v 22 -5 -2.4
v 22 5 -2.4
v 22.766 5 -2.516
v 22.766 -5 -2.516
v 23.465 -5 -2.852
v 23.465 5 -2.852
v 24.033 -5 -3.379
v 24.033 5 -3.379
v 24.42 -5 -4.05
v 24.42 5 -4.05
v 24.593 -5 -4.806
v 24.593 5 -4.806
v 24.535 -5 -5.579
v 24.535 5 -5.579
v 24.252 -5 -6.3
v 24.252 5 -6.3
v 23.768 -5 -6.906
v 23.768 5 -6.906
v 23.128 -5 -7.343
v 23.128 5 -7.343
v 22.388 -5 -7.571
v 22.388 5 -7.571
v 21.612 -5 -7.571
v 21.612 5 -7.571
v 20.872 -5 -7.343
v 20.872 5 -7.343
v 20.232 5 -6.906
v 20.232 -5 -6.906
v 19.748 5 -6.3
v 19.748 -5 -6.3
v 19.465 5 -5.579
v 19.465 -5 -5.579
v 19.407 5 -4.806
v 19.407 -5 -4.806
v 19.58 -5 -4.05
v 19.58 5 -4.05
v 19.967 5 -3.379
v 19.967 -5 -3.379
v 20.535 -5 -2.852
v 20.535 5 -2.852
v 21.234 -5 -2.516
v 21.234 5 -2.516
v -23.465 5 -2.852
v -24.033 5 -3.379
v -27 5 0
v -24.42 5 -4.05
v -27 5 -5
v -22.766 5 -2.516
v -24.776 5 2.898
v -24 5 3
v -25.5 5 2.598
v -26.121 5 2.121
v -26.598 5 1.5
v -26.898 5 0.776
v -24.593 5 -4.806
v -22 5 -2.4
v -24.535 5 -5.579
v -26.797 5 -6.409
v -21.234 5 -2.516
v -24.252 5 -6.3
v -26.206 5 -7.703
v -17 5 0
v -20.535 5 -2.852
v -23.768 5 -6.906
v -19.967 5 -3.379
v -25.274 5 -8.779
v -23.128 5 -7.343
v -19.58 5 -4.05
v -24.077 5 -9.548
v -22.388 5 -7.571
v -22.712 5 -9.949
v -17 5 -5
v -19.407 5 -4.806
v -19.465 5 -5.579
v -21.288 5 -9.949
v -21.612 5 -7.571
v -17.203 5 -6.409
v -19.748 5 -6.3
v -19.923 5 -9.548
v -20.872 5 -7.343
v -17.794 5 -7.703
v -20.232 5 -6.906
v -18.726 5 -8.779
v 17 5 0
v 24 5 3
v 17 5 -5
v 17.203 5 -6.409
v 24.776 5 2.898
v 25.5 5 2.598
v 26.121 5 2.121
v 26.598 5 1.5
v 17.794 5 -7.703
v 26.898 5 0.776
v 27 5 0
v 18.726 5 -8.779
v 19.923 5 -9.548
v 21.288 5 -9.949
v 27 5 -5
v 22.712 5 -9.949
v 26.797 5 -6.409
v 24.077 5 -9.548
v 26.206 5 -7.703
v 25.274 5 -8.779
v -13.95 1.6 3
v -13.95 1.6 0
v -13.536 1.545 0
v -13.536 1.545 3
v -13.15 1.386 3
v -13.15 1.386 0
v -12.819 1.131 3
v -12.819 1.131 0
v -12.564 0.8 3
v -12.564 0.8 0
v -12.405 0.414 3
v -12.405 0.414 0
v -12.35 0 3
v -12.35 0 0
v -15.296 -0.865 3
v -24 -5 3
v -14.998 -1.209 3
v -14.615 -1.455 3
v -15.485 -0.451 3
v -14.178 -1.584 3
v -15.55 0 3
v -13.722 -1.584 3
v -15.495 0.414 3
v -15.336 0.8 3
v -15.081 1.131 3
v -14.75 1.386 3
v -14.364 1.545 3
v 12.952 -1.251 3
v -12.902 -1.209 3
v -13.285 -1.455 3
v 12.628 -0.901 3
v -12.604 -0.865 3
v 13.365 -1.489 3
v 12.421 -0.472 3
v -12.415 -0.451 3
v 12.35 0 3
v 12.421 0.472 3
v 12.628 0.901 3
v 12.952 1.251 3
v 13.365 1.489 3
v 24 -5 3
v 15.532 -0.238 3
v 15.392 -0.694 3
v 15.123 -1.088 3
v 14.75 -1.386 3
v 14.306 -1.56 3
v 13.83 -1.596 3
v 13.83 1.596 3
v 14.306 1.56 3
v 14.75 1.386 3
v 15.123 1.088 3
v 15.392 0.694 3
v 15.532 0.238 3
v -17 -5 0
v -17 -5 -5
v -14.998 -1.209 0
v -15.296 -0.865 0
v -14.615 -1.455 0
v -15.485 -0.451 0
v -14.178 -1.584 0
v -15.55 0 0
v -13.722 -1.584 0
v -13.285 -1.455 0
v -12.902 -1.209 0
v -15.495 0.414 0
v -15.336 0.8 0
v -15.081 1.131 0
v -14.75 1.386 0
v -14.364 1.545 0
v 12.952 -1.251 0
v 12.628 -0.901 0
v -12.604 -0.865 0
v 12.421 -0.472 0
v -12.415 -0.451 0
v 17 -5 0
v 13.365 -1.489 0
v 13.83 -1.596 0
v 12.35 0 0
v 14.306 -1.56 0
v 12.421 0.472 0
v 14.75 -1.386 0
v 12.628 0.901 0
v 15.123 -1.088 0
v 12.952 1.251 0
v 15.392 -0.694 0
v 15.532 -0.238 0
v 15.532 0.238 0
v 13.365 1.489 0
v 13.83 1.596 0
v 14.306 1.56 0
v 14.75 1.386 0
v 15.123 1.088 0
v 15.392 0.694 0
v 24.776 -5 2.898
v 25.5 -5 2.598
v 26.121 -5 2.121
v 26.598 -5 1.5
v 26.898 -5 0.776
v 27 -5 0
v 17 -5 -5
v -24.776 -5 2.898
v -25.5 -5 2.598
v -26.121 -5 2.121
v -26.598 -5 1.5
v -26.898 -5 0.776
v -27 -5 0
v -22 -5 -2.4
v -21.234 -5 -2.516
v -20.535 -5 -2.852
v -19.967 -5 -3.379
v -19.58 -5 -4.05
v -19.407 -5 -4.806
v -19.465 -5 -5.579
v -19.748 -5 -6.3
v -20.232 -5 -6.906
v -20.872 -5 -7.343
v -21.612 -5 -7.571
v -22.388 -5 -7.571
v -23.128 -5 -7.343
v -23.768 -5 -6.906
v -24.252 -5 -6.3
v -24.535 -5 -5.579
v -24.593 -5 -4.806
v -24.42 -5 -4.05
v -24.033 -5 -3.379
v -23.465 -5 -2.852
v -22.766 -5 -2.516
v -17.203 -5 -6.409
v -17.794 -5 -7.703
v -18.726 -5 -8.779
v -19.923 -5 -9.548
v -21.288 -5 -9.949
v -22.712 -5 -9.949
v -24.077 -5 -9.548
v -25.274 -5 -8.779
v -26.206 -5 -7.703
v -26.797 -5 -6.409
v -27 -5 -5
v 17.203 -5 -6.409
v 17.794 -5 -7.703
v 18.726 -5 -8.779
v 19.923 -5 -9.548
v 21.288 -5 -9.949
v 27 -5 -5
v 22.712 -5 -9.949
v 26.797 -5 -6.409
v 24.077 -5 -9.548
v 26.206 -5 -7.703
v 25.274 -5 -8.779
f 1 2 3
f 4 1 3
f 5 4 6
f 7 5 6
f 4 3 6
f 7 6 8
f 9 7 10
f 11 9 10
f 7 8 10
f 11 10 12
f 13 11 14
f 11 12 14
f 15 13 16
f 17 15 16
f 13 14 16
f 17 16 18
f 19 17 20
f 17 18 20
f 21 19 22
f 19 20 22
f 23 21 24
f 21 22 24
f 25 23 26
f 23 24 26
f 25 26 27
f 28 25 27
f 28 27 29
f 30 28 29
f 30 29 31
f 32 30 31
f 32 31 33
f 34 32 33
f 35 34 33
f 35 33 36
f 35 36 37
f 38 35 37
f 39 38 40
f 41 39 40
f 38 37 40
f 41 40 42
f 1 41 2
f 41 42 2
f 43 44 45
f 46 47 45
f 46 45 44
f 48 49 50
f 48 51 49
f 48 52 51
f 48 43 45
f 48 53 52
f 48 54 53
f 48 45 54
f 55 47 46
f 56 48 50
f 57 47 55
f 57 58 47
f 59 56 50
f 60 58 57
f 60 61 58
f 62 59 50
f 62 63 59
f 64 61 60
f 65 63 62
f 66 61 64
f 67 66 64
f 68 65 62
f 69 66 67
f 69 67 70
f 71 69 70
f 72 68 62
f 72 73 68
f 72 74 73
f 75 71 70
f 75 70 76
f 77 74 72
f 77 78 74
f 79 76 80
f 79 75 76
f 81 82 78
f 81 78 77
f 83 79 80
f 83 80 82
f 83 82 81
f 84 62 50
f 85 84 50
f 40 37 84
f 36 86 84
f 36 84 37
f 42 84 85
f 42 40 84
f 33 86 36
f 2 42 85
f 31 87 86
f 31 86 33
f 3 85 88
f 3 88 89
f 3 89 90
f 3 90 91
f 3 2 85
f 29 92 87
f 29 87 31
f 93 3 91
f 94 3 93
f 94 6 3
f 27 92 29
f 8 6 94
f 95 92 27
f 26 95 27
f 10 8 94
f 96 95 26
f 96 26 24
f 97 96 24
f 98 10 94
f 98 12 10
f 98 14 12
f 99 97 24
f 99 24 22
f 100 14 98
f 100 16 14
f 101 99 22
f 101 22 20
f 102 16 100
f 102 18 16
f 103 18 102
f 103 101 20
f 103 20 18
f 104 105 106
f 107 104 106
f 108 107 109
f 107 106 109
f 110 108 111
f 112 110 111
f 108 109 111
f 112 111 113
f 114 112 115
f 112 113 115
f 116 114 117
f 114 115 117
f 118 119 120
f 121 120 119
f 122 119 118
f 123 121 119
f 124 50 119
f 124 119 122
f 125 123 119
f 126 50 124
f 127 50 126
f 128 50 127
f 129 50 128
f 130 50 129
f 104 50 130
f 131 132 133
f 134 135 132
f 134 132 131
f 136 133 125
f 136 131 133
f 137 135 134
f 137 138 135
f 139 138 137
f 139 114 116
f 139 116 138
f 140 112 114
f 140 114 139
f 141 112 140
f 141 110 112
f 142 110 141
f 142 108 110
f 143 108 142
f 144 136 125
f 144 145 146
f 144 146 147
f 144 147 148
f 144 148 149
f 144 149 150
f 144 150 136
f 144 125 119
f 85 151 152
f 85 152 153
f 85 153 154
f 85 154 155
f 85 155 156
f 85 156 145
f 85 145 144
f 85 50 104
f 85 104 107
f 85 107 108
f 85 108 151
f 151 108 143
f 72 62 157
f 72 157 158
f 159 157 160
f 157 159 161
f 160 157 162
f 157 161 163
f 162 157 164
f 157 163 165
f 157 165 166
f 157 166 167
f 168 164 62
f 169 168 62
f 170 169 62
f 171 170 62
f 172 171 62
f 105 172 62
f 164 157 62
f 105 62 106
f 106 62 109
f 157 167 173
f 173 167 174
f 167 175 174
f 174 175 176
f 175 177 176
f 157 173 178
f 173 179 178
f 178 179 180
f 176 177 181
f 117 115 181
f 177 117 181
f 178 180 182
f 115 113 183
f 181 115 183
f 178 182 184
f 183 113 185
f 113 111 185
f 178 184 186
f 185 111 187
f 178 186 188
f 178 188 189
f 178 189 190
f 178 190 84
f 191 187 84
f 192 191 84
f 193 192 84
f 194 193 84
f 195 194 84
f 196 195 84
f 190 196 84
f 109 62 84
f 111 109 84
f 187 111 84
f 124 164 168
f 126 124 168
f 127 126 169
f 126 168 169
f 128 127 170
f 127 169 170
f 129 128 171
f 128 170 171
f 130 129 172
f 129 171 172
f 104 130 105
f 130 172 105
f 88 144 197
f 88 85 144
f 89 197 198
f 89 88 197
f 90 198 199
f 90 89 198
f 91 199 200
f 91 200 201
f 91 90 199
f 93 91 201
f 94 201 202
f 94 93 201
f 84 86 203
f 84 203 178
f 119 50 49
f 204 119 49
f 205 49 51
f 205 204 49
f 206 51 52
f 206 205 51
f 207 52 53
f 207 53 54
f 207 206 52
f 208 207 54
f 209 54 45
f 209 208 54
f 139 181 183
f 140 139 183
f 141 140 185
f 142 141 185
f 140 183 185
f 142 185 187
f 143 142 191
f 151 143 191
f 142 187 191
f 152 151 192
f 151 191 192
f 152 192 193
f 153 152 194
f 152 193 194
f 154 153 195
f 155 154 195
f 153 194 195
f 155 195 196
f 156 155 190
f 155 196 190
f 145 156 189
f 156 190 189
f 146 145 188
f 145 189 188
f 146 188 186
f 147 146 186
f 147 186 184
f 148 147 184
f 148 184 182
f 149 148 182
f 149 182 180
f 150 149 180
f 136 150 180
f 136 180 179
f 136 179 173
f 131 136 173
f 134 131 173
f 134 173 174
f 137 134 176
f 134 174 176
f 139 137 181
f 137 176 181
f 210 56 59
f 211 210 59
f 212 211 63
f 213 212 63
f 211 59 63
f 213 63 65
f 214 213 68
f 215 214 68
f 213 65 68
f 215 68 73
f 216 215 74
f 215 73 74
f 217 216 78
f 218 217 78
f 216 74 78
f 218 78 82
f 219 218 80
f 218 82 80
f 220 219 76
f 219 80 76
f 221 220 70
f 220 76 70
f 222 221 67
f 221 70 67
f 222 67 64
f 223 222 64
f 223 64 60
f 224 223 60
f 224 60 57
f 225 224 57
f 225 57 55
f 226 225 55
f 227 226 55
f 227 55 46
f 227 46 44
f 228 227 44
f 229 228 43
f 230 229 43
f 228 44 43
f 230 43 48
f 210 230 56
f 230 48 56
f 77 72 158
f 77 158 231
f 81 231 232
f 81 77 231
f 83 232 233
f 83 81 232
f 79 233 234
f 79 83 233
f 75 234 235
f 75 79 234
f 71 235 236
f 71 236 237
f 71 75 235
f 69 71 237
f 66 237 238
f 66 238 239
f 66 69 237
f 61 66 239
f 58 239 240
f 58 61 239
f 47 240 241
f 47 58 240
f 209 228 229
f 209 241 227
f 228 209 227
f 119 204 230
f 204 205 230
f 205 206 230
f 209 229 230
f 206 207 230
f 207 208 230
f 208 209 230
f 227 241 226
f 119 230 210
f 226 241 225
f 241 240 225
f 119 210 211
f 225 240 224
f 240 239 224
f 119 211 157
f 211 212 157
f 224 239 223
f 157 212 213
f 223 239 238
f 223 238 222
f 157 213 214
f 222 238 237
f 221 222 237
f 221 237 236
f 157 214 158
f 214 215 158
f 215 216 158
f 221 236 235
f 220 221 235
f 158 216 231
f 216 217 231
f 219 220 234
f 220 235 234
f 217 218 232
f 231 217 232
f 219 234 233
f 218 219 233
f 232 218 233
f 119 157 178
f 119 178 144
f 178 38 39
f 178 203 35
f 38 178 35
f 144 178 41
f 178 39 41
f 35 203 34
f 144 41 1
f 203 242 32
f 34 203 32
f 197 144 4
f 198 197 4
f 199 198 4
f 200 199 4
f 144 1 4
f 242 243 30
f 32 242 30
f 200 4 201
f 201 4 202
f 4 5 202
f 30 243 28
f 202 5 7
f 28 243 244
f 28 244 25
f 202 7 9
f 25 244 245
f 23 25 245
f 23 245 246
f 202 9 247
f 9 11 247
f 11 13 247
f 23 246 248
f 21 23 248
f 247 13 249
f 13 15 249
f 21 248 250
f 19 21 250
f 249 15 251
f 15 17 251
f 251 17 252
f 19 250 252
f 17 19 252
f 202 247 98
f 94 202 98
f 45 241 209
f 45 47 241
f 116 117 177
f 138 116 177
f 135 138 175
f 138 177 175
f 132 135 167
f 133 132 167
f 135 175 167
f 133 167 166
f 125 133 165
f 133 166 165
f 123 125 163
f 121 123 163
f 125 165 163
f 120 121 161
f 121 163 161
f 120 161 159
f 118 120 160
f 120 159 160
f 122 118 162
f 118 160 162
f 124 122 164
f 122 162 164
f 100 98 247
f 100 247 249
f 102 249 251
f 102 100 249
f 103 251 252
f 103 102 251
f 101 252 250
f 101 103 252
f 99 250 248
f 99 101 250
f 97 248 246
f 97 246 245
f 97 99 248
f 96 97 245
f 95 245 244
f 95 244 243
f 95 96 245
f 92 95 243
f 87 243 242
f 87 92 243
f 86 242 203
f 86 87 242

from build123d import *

# Parameters (mm, degrees)
EXTRUDE_1_DEPTH = 3
SKETCH_2_R      = 5
SKETCH_2_R_2    = 2.6
EXTRUDE_2_DEPTH = 10
FILLET_1_R      = 3


with BuildPart() as part:
    # 草图1 → 凸台-拉伸1 (new body)
    with BuildSketch(Plane.XY):
        with BuildLine():
            Line((0, 5), (-13.95, 5))
            Line((-13.95, 5), (-13.95, 1.6))
            ThreePointArc((-13.95, 1.6), (-12.81862915, 1.13137085), (-12.35, 0))
            Line((-12.35, 0), (0, 0))
            Line((0, 0), (0, 5))
        make_face()
        with BuildLine():
            Line((-27, 5), (-27, 0))
            Line((-27, 0), (-17, 0))
            Line((-17, 0), (-15.55, 0))
            ThreePointArc((-15.55, 0), (-15.08137085, 1.13137085), (-13.95, 1.6))
            Line((-13.95, 1.6), (-13.95, 5))
            Line((-13.95, 5), (-27, 5))
        make_face()
        with BuildLine():
            Line((-17, 0), (-27, 0))
            Line((-27, 0), (-27, -5))
            Line((-27, -5), (27, -5))
            Line((27, -5), (27, 0))
            Line((27, 0), (17, 0))
            Line((17, 0), (15.55, 0))
            ThreePointArc((15.55, 0), (13.95, -1.6), (12.35, 0))
            Line((12.35, 0), (0, 0))
            Line((0, 0), (-12.35, 0))
            ThreePointArc((-12.35, 0), (-13.95, -1.6), (-15.55, 0))
            Line((-15.55, 0), (-17, 0))
        make_face()
        with BuildLine():
            Line((17, 0), (27, 0))
            Line((27, 0), (27, 5))
            Line((27, 5), (0, 5))
            Line((0, 5), (0, 0))
            Line((0, 0), (12.35, 0))
            ThreePointArc((12.35, 0), (13.95, 1.6), (15.55, 0))
            Line((15.55, 0), (17, 0))
        make_face()
    extrude(amount=EXTRUDE_1_DEPTH)

    # 草图2 → 凸台-拉伸2 (add, through all)
    # profile 1 of 6: a face of its own
    with BuildSketch(Plane(origin=(0, 5, 0), x_dir=(1, 0, 0), z_dir=(0, 1, 0))):
        with Locations((-22, 5)):
            Circle(SKETCH_2_R)
        with Locations(Location((-22, 5, 0), (0, 0, 270))):
            Circle(SKETCH_2_R_2, mode=Mode.SUBTRACT)
    # profile 2 of 6: a face of its own
    with BuildSketch(Plane(origin=(0, 5, 0), x_dir=(1, 0, 0), z_dir=(0, 1, 0))):
        with BuildLine():
            Line((-17, 0), (-17, 5))
            ThreePointArc((-17, 5), (-18.464466102, 1.464466086), (-22.000000023, 0))
            Line((-22.000000023, 0), (-17, 0))
        make_face()
    # profile 3 of 6: a face of its own
    with BuildSketch(Plane(origin=(0, 5, 0), x_dir=(1, 0, 0), z_dir=(0, 1, 0))):
        with BuildLine():
            ThreePointArc((-22.000000023, 0), (-25.535533914, 1.464466102), (-27, 5))
            Line((-27, 5), (-27, 0))
            Line((-27, 0), (-22.000000023, 0))
        make_face()
    # profile 4 of 6: a face of its own
    with BuildSketch(Plane(origin=(0, 5, 0), x_dir=(1, 0, 0), z_dir=(0, 1, 0))):
        with BuildLine():
            Line((17, 5), (17, 0))
            Line((17, 0), (22, 0))
            ThreePointArc((22, 0), (18.464466094, 1.464466094), (17, 5))
        make_face()
    # profile 5 of 6: a face of its own
    with BuildSketch(Plane(origin=(0, 5, 0), x_dir=(1, 0, 0), z_dir=(0, 1, 0))):
        with Locations((22, 5)):
            Circle(SKETCH_2_R)
        with Locations(Location((22, 5, 0), (0, 0, 270))):
            Circle(SKETCH_2_R_2, mode=Mode.SUBTRACT)
    # profile 6 of 6: a face of its own
    with BuildSketch(Plane(origin=(0, 5, 0), x_dir=(1, 0, 0), z_dir=(0, 1, 0))):
        with BuildLine():
            ThreePointArc((27, 5), (25.535533906, 1.464466094), (22, 0))
            Line((22, 0), (27, 0))
            Line((27, 0), (27, 5))
        make_face()
    extrude(amount=-EXTRUDE_2_DEPTH)

    # 圆角1
    fillet_1_edges = [part.edges().sort_by_distance(p)[0] for p in [
        (27, 0, 3),
        (-27, 0, 3),
    ]]
    fillet(fillet_1_edges, radius=FILLET_1_R)


solid = part.part
